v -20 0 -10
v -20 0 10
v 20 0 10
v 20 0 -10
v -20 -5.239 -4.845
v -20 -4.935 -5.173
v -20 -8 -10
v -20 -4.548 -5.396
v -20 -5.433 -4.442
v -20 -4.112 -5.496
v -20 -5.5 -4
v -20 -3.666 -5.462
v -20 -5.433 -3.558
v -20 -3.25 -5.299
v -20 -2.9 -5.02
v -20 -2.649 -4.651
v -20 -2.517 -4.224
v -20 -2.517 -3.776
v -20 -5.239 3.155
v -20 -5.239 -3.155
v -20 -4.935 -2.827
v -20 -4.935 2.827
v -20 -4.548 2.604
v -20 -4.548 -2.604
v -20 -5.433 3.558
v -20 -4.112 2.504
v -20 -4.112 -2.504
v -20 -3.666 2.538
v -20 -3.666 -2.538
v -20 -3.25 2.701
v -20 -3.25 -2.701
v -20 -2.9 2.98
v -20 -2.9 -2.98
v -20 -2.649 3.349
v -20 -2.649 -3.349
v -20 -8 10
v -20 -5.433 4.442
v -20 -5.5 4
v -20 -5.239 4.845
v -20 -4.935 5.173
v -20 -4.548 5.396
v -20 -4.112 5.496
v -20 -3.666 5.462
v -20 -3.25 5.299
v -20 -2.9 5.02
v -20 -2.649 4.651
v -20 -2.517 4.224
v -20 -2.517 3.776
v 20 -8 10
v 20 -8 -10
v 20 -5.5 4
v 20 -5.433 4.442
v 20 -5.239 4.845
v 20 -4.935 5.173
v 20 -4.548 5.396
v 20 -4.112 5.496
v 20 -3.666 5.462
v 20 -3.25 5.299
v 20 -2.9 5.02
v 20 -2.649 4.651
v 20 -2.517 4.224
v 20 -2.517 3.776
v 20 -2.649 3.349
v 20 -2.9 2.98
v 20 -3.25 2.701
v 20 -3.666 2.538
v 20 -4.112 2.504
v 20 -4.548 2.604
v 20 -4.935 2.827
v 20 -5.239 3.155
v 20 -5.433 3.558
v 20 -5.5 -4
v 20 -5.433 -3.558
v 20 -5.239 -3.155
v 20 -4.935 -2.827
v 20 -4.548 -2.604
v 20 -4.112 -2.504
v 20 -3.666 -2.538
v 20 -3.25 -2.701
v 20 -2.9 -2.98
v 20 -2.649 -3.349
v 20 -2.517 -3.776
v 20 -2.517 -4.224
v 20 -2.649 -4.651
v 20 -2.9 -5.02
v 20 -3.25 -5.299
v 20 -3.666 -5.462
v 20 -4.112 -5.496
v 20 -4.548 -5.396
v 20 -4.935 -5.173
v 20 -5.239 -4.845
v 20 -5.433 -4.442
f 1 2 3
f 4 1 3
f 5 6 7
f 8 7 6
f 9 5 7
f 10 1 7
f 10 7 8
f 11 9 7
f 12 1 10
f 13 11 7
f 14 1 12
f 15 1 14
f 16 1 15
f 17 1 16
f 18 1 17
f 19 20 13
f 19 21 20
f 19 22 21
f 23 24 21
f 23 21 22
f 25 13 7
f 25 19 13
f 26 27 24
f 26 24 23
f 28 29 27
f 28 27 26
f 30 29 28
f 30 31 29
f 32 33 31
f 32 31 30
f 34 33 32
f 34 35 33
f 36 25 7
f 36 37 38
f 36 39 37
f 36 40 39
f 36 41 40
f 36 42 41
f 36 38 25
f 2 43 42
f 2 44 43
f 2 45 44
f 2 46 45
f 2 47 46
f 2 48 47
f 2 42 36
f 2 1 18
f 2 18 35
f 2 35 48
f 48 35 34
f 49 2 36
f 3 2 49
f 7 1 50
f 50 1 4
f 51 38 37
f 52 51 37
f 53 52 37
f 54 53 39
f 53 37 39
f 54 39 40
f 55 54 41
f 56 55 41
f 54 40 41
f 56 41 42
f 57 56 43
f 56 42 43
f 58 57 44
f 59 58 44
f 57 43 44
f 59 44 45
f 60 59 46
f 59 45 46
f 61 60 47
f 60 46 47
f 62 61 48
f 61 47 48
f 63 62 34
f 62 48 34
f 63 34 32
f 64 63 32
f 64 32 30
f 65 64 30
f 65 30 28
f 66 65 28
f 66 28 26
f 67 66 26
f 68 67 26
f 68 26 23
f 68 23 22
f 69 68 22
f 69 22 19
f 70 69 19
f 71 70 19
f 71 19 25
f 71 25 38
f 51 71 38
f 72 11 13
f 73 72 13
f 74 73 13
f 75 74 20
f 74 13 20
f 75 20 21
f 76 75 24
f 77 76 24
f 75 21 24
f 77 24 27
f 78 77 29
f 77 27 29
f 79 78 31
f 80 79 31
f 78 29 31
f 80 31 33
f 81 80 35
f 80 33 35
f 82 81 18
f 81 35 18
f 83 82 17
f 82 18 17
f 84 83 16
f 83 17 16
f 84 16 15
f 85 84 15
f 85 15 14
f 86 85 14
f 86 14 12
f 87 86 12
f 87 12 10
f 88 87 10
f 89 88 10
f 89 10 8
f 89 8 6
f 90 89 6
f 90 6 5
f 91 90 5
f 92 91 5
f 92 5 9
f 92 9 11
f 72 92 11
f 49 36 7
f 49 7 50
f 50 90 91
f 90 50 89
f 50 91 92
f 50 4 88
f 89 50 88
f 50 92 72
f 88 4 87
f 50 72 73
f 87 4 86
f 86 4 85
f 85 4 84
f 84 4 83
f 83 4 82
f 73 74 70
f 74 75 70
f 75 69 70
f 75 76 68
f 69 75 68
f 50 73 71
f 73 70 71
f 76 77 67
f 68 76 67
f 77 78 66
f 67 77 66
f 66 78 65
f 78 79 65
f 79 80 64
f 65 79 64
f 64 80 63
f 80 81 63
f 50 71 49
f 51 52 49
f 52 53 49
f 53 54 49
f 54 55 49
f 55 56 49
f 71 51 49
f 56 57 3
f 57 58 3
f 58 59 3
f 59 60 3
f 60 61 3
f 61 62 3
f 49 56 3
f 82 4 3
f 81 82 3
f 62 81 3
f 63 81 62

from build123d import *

# Parameters (mm, degrees)
F0_W     = 40
F0_H     = 20
F1_DEPTH = 8
F2_R     = 1.5
F3_DEPTH = 40.001


with BuildPart() as f1:
    # F0 (on Front) → F1 (new body)
    with BuildSketch(Plane.XZ):
        Rectangle(F0_W, F0_H)
    extrude(amount=F1_DEPTH)

    # F2 (on face) → F3 (cut, through all)
    with BuildSketch(Plane(origin=(-20, 0, 0), x_dir=(0, -1, 0), z_dir=(-1, 0, 0))):
        with Locations((4, 4)):
            Circle(F2_R)
        with Locations((4, -4)):
            Circle(F2_R)
    extrude(amount=-F3_DEPTH, mode=Mode.SUBTRACT)


solid = f1.part
